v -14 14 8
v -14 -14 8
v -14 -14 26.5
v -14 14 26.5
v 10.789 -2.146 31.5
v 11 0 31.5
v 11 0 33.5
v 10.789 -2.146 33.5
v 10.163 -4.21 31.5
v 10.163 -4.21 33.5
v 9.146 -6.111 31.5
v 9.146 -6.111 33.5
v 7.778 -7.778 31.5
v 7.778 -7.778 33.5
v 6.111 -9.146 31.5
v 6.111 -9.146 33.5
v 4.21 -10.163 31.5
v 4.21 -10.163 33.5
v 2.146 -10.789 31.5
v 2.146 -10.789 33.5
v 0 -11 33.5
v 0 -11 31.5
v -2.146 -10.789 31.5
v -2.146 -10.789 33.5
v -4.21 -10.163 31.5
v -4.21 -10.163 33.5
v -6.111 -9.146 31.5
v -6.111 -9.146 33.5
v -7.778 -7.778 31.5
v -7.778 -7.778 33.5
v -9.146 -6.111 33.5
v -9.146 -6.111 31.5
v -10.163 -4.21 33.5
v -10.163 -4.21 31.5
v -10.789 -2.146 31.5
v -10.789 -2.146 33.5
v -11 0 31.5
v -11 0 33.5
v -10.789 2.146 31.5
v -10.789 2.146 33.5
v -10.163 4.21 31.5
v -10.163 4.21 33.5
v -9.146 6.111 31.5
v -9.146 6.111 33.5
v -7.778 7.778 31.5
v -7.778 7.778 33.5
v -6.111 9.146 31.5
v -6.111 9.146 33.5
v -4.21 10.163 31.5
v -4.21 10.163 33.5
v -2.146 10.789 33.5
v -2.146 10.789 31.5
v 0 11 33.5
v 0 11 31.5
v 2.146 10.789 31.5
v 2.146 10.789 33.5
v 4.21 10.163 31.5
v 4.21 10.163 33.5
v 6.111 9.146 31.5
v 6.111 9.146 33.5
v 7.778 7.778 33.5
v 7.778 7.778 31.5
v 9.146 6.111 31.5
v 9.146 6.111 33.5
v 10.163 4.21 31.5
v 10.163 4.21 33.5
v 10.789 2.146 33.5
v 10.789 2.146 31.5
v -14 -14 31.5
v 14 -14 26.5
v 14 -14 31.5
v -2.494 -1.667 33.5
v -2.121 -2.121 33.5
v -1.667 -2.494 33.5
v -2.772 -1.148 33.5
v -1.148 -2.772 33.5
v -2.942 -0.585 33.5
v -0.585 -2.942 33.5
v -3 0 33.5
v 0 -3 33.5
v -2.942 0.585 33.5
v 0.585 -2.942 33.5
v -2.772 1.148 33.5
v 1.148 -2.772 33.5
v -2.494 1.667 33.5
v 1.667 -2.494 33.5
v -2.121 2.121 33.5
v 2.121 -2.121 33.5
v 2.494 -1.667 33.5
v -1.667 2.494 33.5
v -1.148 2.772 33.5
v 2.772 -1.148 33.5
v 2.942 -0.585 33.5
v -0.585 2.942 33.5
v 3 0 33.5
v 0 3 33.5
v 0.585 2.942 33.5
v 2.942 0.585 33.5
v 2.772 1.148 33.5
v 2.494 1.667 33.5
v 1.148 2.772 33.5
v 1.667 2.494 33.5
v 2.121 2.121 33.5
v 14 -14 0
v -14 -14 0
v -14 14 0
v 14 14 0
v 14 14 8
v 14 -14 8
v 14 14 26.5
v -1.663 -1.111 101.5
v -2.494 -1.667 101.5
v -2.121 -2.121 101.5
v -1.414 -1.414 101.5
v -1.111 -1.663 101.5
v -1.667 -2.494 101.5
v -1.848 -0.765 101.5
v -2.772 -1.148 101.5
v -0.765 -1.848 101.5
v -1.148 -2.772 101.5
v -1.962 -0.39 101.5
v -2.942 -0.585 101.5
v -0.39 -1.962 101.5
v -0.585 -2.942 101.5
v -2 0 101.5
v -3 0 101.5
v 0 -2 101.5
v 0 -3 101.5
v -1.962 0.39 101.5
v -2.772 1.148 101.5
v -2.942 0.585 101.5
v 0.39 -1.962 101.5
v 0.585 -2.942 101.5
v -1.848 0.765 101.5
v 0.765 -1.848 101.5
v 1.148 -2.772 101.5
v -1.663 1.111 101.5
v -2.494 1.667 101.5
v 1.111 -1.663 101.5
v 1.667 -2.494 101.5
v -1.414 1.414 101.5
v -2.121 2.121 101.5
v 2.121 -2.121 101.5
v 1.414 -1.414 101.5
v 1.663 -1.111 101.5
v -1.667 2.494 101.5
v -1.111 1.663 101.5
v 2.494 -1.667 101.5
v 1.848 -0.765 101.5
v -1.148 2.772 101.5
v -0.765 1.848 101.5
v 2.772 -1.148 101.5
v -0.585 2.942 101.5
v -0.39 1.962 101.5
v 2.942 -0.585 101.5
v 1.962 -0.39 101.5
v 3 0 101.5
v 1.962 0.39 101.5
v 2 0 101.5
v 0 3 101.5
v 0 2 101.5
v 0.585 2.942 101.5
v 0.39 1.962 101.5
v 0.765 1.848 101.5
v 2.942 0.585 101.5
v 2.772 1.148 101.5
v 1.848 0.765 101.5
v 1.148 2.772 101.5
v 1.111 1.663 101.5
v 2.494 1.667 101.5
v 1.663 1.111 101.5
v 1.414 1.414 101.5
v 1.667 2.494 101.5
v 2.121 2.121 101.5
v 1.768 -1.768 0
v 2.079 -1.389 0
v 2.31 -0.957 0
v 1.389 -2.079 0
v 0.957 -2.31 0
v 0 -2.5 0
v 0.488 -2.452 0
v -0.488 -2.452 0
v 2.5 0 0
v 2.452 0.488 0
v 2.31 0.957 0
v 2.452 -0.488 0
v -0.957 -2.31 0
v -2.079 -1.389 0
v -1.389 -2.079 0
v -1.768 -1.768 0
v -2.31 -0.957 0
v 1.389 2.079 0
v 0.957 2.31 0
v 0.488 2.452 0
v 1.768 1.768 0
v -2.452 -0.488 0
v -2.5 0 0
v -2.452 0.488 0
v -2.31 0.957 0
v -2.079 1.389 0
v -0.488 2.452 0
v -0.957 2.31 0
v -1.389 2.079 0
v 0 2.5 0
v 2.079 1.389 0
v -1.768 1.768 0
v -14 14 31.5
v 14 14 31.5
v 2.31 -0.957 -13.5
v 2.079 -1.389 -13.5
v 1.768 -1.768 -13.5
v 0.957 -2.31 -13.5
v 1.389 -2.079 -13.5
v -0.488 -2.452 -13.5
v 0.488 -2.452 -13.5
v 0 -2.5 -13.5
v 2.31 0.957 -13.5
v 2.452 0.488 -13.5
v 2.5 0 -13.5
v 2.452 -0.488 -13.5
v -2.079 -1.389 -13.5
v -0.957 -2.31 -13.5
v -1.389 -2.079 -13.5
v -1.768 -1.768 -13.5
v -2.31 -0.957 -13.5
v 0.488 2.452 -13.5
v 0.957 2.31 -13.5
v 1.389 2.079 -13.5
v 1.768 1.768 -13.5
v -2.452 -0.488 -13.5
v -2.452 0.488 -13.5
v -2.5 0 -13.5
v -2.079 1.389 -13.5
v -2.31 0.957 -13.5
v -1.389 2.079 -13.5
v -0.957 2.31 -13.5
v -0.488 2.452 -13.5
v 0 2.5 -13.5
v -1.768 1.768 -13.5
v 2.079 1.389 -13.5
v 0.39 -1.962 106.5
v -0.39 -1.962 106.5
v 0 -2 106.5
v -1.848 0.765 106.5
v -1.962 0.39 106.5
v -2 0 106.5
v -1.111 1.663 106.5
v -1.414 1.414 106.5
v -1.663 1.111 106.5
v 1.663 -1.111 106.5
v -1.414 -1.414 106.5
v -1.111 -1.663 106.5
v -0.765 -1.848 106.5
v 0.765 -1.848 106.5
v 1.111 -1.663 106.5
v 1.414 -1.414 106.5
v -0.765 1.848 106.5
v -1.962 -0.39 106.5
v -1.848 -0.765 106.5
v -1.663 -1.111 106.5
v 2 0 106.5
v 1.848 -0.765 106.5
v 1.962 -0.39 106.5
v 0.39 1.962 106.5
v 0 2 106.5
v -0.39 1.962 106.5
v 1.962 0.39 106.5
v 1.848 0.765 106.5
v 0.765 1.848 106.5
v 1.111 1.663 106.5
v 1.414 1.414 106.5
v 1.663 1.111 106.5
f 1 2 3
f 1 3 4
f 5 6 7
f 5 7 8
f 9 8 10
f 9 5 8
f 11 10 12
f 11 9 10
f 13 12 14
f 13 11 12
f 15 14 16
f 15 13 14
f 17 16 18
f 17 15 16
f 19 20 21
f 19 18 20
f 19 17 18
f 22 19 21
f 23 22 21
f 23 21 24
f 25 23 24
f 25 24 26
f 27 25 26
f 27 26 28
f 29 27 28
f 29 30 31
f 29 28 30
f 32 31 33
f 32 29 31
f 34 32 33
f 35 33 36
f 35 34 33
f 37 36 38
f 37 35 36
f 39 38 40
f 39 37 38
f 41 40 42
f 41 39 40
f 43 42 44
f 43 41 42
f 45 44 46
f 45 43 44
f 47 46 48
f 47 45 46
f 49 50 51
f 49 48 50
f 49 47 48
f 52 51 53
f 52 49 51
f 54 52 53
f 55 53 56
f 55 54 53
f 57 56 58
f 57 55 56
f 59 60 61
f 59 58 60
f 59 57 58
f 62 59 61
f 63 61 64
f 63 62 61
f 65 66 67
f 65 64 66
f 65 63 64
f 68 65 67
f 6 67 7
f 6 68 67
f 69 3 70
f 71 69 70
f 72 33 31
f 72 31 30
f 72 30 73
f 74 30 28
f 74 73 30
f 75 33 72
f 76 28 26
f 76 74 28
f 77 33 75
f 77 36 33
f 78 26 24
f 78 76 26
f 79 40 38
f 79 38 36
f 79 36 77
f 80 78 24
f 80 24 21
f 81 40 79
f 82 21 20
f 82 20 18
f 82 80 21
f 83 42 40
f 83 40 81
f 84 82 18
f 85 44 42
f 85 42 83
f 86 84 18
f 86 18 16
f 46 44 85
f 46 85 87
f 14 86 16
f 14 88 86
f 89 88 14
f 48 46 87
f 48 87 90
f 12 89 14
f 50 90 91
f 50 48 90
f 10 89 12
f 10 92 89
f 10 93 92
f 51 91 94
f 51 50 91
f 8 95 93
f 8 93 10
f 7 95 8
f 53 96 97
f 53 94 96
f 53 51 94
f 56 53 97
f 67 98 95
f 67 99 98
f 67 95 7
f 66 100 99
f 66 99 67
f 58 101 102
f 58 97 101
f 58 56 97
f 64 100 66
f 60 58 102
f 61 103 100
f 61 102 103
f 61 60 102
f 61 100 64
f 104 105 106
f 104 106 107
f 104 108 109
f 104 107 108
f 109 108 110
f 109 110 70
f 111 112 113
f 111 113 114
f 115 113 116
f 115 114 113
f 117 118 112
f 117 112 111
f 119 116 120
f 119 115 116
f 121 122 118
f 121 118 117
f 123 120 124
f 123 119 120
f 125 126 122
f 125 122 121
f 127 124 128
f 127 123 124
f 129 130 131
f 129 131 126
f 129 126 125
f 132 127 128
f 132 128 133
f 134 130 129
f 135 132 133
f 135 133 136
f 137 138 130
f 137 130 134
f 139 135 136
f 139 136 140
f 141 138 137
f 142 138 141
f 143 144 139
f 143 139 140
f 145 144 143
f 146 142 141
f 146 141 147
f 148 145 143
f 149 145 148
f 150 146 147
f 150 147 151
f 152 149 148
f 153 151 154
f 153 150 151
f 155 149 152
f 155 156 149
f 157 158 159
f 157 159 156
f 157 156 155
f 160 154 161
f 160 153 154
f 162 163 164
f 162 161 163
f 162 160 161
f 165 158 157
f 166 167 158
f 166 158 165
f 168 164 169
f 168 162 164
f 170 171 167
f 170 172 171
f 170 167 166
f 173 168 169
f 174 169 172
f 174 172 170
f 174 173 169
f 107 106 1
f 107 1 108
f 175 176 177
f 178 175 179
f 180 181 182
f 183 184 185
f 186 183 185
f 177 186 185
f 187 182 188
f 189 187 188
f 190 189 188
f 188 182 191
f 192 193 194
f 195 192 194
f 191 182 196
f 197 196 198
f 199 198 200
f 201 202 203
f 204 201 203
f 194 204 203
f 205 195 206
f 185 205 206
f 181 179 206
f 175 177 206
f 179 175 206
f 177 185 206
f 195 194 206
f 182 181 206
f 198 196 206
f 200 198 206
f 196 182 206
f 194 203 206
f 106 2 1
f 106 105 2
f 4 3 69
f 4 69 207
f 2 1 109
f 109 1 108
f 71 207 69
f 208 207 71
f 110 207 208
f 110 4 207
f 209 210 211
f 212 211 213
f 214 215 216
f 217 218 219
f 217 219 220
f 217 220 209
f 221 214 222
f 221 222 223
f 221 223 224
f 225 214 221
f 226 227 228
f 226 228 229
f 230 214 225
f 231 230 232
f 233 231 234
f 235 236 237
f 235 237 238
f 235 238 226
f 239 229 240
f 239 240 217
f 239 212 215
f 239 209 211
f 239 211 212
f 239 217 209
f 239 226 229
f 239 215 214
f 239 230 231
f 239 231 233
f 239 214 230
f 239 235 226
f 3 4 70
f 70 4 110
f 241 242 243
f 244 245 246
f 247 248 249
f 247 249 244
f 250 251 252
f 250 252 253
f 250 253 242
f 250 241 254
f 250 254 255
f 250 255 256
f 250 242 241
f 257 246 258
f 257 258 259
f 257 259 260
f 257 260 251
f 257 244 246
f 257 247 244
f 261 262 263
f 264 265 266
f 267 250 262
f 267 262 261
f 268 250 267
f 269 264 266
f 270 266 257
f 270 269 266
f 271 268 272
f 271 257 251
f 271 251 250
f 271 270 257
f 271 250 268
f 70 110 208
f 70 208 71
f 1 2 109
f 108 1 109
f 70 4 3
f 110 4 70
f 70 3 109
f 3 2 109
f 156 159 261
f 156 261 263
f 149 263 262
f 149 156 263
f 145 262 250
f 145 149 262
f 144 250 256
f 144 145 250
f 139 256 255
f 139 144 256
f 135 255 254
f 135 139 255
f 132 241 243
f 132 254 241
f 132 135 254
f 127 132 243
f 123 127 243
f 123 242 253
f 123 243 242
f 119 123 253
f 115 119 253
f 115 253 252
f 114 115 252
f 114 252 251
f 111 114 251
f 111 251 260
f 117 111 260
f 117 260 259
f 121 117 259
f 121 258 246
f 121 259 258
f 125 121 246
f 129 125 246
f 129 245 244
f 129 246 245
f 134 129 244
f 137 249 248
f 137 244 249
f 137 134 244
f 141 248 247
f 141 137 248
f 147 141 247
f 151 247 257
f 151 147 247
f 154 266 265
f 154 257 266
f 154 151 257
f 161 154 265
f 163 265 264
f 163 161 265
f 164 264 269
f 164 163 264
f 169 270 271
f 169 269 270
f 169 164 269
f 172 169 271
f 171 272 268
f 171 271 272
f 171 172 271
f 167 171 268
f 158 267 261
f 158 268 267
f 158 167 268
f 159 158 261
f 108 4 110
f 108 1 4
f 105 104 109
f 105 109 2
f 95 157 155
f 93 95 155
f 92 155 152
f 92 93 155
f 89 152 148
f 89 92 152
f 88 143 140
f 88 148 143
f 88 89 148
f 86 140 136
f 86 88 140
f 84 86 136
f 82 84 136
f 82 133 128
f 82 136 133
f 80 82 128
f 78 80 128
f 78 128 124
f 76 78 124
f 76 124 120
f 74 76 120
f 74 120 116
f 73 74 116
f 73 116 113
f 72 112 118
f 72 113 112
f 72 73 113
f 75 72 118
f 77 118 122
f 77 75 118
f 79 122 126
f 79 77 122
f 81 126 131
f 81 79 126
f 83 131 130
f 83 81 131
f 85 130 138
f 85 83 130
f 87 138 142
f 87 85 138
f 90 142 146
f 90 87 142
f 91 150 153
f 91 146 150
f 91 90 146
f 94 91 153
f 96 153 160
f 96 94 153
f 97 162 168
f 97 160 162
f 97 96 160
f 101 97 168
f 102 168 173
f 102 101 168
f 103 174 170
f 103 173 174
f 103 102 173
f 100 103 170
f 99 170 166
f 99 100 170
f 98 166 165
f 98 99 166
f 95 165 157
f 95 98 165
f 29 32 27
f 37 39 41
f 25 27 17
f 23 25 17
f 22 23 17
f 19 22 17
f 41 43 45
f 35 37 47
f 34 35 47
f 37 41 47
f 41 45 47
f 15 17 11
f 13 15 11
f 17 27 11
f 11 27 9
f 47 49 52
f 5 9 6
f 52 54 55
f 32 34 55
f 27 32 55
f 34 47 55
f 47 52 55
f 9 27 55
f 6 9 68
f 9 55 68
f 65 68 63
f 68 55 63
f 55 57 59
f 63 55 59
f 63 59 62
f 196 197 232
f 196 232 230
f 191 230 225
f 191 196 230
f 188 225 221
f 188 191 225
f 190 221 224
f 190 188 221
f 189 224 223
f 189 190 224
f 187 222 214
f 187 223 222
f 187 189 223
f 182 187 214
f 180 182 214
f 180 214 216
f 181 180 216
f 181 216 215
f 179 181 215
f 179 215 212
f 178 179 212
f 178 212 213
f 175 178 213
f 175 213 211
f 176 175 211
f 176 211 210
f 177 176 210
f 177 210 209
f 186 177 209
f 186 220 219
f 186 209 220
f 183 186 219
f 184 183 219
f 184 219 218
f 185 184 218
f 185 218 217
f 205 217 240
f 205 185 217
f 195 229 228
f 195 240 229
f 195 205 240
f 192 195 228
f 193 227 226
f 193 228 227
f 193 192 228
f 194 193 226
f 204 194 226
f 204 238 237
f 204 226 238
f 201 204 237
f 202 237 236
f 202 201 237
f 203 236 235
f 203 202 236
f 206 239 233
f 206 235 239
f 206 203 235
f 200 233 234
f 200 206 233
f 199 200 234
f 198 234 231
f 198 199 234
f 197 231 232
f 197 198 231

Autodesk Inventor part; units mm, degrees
ref_plane "YZ Plane" through (0, 0, 0) normal (1, 0, 0) x (0, 1, 0)
ref_plane "XZ Plane" through (0, 0, 0) normal (0, 1, 0) x (-1, 0, 0)
ref_plane "XY Plane" through (0, 0, 0) normal (0, 0, 1) x (1, 0, 0)
sketch "Sketch1" plane through (0, 0, 0) normal (0, 0, 1) x (1, 0, 0)
  line L0 (0, -19.6) -> (0, 19.6) projected
  line L1 (-19.6, 0) -> (19.6, 0) projected
  line L2 (-14, 14) -> (14, 14)
  line L3 (14, 14) -> (14, -14)
  line L4 (14, -14) -> (-14, -14)
  line L5 (-14, -14) -> (-14, 14)
  line L6 (-14, 14) -> (14, -14) construction
  line L7 (14, 14) -> (-14, -14) construction
  point P0 (0, 0)
  dimension "d0" = 28
  dimension "d1" = 28
extrude "Extrusion1" add sketch "Sketch1" along normal blind 8
sketch "Sketch2" plane through (0, 0, 8) normal (0, 0, 1) x (1, 0, 0)
  line L0 (-14, -14) -> (14, -14) projected
  line L1 (-14, 14) -> (14, 14)
  line L2 (14, 14) -> (14, -14)
  line L3 (14, -14) -> (-14, -14)
  line L4 (-14, -14) -> (-14, 14)
  line L5 (-14, 14) -> (14, -14) construction
  line L6 (14, 14) -> (-14, -14) construction
  point P0 (0, 0)
extrude "Extrusion2" add sketch "Sketch2" along normal blind 18.5 separate body
sketch "Sketch3" plane through (0, 0, 26.5) normal (0, 0, 1) x (1, 0, 0)
  line L0 (-14, -14) -> (14, -14) projected
  line L1 (-14, 14) -> (14, 14)
  line L2 (14, 14) -> (14, -14)
  line L3 (14, -14) -> (-14, -14)
  line L4 (-14, -14) -> (-14, 14)
  line L5 (-14, 14) -> (14, -14) construction
  line L6 (14, 14) -> (-14, -14) construction
  point P0 (0, 0)
extrude "Extrusion3" add sketch "Sketch3" along normal blind 5 separate body
sketch "Sketch4" plane through (0, 0, 31.5) normal (0, 0, 1) x (1, 0, 0)
  circle A0 centre (0, 0) radius 11
  dimension "d8" = 22
extrude "Extrusion4" add sketch "Sketch4" along normal blind 2 separate body
sketch "Sketch6" plane through (0, 0, 0) normal (0, 0, -1) x (-1, 0, 0)
  circle A0 centre (0, 0) radius 2.5
  dimension "d14" = 5
extrude "Extrusion6" add sketch "Sketch6" along normal blind 13.5 separate body
sketch "Sketch7" plane through (0, 0, 33.5) normal (0, 0, 1) x (1, 0, 0)
  circle A0 centre (0, 0) radius 3
  dimension "d17" = 6
extrude "Extrusion7" add sketch "Sketch7" along normal blind 68 bodies 4
sketch "Sketch8" plane through (0, 0, 101.5) normal (0, 0, 1) x (1, 0, 0)
  circle A0 centre (0, 0) radius 2
  dimension "d20" = 4
extrude "Extrusion8" add sketch "Sketch8" along normal blind 5 bodies 4
properties part number "duzy_silnik"
